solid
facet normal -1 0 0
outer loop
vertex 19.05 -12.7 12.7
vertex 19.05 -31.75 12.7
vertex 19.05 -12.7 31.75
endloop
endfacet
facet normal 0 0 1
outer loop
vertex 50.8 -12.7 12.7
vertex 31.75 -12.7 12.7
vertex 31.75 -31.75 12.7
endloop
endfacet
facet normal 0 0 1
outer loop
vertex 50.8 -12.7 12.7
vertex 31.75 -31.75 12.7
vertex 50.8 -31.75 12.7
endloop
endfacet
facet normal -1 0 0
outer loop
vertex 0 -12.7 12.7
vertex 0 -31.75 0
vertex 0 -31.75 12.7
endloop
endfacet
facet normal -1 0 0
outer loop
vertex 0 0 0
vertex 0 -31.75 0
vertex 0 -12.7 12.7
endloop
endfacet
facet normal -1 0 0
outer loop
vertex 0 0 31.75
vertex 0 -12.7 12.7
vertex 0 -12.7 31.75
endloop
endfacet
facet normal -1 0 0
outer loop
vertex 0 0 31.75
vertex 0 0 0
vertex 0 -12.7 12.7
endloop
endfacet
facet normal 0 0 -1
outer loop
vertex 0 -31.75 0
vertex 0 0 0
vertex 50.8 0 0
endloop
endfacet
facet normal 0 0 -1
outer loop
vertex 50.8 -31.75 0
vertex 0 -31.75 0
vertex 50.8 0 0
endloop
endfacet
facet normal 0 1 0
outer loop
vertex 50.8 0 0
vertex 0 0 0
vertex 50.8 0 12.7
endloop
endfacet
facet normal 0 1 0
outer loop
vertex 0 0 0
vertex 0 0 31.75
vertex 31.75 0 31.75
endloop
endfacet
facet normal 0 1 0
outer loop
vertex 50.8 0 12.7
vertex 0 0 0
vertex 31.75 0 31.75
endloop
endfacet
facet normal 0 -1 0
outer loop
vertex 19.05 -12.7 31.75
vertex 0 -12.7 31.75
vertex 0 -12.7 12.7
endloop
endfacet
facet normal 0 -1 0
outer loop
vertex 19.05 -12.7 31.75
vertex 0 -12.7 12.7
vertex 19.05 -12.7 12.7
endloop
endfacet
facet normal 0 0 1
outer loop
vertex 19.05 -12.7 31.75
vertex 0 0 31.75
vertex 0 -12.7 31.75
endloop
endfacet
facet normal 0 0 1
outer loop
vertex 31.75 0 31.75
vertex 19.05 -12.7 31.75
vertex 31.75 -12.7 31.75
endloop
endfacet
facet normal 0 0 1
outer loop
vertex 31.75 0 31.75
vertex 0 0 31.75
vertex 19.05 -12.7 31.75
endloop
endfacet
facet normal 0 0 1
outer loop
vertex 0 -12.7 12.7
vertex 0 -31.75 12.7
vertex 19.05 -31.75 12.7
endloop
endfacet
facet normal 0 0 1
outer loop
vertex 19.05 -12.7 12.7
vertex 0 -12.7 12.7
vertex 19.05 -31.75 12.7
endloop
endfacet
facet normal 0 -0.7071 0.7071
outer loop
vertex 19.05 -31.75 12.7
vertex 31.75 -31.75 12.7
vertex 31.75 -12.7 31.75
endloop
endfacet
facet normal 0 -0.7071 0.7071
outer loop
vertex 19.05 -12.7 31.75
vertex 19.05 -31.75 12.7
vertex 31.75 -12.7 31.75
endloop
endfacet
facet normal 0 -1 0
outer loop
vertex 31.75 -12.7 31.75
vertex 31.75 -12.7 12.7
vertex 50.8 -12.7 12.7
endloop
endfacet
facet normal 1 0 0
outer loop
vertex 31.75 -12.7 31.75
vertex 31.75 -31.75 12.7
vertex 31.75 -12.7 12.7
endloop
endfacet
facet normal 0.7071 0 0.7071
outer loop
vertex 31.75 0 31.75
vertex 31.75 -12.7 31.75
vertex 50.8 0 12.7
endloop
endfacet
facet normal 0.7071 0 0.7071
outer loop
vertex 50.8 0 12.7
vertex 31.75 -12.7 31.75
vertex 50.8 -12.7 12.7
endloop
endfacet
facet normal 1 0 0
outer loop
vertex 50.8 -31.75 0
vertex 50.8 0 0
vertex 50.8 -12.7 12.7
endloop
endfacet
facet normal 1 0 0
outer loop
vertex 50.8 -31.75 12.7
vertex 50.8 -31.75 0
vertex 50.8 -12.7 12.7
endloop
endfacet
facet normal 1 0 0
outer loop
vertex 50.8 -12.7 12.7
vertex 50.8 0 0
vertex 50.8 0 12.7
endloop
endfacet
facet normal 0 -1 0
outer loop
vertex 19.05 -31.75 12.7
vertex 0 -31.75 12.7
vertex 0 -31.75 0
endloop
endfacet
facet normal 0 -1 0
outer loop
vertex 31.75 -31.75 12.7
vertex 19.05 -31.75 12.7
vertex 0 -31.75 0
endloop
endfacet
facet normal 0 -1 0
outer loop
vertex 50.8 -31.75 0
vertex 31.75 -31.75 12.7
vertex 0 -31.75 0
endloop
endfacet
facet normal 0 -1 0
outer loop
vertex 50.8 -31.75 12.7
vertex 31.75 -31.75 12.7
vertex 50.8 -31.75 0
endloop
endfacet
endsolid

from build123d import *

# Parameters (mm, degrees)
F0_W     = 50.8
F0_H     = 31.75
F1_DEPTH = 31.75
F2_W     = 19.05
F2_H     = 19.05
F3_DEPTH = 19.05
F4_DEPTH = 19.05
F6_DEPTH = 12.7
F8_DEPTH = 12.7


with BuildPart() as f1:
    # F0 (on Front) → F1 (new body)
    with BuildSketch(Plane.XZ):
        with Locations((25.4, 15.875)):
            Rectangle(F0_W, F0_H)
    extrude(amount=F1_DEPTH)

    # F2 (on face) → F3 (cut)
    with BuildSketch(Plane.XZ.offset(31.75)):
        with Locations((41.275, 22.225)):
            Rectangle(F2_W, F2_H)
    extrude(amount=-F3_DEPTH, mode=Mode.SUBTRACT)

    # F2 (on face) → F4 (cut)
    with BuildSketch(Plane.XZ.offset(31.75)):
        with Locations((9.525, 22.225)):
            Rectangle(F2_W, F2_H)
    extrude(amount=-F4_DEPTH, mode=Mode.SUBTRACT)

    # F5 (on face) → F6 (cut)
    with BuildSketch(Plane.YZ.offset(31.75)):
        Polygon((-31.75, 12.7), (-12.7, 31.75), (-31.75, 31.75), align=None)
    extrude(amount=-F6_DEPTH, mode=Mode.SUBTRACT)

    # F7 (on face) → F8 (cut)
    with BuildSketch(Plane.XZ.offset(12.7)):
        Polygon((50.8, 31.75), (31.75, 31.75), (50.8, 12.7), align=None)
    extrude(amount=-F8_DEPTH, mode=Mode.SUBTRACT)


solid = f1.part
